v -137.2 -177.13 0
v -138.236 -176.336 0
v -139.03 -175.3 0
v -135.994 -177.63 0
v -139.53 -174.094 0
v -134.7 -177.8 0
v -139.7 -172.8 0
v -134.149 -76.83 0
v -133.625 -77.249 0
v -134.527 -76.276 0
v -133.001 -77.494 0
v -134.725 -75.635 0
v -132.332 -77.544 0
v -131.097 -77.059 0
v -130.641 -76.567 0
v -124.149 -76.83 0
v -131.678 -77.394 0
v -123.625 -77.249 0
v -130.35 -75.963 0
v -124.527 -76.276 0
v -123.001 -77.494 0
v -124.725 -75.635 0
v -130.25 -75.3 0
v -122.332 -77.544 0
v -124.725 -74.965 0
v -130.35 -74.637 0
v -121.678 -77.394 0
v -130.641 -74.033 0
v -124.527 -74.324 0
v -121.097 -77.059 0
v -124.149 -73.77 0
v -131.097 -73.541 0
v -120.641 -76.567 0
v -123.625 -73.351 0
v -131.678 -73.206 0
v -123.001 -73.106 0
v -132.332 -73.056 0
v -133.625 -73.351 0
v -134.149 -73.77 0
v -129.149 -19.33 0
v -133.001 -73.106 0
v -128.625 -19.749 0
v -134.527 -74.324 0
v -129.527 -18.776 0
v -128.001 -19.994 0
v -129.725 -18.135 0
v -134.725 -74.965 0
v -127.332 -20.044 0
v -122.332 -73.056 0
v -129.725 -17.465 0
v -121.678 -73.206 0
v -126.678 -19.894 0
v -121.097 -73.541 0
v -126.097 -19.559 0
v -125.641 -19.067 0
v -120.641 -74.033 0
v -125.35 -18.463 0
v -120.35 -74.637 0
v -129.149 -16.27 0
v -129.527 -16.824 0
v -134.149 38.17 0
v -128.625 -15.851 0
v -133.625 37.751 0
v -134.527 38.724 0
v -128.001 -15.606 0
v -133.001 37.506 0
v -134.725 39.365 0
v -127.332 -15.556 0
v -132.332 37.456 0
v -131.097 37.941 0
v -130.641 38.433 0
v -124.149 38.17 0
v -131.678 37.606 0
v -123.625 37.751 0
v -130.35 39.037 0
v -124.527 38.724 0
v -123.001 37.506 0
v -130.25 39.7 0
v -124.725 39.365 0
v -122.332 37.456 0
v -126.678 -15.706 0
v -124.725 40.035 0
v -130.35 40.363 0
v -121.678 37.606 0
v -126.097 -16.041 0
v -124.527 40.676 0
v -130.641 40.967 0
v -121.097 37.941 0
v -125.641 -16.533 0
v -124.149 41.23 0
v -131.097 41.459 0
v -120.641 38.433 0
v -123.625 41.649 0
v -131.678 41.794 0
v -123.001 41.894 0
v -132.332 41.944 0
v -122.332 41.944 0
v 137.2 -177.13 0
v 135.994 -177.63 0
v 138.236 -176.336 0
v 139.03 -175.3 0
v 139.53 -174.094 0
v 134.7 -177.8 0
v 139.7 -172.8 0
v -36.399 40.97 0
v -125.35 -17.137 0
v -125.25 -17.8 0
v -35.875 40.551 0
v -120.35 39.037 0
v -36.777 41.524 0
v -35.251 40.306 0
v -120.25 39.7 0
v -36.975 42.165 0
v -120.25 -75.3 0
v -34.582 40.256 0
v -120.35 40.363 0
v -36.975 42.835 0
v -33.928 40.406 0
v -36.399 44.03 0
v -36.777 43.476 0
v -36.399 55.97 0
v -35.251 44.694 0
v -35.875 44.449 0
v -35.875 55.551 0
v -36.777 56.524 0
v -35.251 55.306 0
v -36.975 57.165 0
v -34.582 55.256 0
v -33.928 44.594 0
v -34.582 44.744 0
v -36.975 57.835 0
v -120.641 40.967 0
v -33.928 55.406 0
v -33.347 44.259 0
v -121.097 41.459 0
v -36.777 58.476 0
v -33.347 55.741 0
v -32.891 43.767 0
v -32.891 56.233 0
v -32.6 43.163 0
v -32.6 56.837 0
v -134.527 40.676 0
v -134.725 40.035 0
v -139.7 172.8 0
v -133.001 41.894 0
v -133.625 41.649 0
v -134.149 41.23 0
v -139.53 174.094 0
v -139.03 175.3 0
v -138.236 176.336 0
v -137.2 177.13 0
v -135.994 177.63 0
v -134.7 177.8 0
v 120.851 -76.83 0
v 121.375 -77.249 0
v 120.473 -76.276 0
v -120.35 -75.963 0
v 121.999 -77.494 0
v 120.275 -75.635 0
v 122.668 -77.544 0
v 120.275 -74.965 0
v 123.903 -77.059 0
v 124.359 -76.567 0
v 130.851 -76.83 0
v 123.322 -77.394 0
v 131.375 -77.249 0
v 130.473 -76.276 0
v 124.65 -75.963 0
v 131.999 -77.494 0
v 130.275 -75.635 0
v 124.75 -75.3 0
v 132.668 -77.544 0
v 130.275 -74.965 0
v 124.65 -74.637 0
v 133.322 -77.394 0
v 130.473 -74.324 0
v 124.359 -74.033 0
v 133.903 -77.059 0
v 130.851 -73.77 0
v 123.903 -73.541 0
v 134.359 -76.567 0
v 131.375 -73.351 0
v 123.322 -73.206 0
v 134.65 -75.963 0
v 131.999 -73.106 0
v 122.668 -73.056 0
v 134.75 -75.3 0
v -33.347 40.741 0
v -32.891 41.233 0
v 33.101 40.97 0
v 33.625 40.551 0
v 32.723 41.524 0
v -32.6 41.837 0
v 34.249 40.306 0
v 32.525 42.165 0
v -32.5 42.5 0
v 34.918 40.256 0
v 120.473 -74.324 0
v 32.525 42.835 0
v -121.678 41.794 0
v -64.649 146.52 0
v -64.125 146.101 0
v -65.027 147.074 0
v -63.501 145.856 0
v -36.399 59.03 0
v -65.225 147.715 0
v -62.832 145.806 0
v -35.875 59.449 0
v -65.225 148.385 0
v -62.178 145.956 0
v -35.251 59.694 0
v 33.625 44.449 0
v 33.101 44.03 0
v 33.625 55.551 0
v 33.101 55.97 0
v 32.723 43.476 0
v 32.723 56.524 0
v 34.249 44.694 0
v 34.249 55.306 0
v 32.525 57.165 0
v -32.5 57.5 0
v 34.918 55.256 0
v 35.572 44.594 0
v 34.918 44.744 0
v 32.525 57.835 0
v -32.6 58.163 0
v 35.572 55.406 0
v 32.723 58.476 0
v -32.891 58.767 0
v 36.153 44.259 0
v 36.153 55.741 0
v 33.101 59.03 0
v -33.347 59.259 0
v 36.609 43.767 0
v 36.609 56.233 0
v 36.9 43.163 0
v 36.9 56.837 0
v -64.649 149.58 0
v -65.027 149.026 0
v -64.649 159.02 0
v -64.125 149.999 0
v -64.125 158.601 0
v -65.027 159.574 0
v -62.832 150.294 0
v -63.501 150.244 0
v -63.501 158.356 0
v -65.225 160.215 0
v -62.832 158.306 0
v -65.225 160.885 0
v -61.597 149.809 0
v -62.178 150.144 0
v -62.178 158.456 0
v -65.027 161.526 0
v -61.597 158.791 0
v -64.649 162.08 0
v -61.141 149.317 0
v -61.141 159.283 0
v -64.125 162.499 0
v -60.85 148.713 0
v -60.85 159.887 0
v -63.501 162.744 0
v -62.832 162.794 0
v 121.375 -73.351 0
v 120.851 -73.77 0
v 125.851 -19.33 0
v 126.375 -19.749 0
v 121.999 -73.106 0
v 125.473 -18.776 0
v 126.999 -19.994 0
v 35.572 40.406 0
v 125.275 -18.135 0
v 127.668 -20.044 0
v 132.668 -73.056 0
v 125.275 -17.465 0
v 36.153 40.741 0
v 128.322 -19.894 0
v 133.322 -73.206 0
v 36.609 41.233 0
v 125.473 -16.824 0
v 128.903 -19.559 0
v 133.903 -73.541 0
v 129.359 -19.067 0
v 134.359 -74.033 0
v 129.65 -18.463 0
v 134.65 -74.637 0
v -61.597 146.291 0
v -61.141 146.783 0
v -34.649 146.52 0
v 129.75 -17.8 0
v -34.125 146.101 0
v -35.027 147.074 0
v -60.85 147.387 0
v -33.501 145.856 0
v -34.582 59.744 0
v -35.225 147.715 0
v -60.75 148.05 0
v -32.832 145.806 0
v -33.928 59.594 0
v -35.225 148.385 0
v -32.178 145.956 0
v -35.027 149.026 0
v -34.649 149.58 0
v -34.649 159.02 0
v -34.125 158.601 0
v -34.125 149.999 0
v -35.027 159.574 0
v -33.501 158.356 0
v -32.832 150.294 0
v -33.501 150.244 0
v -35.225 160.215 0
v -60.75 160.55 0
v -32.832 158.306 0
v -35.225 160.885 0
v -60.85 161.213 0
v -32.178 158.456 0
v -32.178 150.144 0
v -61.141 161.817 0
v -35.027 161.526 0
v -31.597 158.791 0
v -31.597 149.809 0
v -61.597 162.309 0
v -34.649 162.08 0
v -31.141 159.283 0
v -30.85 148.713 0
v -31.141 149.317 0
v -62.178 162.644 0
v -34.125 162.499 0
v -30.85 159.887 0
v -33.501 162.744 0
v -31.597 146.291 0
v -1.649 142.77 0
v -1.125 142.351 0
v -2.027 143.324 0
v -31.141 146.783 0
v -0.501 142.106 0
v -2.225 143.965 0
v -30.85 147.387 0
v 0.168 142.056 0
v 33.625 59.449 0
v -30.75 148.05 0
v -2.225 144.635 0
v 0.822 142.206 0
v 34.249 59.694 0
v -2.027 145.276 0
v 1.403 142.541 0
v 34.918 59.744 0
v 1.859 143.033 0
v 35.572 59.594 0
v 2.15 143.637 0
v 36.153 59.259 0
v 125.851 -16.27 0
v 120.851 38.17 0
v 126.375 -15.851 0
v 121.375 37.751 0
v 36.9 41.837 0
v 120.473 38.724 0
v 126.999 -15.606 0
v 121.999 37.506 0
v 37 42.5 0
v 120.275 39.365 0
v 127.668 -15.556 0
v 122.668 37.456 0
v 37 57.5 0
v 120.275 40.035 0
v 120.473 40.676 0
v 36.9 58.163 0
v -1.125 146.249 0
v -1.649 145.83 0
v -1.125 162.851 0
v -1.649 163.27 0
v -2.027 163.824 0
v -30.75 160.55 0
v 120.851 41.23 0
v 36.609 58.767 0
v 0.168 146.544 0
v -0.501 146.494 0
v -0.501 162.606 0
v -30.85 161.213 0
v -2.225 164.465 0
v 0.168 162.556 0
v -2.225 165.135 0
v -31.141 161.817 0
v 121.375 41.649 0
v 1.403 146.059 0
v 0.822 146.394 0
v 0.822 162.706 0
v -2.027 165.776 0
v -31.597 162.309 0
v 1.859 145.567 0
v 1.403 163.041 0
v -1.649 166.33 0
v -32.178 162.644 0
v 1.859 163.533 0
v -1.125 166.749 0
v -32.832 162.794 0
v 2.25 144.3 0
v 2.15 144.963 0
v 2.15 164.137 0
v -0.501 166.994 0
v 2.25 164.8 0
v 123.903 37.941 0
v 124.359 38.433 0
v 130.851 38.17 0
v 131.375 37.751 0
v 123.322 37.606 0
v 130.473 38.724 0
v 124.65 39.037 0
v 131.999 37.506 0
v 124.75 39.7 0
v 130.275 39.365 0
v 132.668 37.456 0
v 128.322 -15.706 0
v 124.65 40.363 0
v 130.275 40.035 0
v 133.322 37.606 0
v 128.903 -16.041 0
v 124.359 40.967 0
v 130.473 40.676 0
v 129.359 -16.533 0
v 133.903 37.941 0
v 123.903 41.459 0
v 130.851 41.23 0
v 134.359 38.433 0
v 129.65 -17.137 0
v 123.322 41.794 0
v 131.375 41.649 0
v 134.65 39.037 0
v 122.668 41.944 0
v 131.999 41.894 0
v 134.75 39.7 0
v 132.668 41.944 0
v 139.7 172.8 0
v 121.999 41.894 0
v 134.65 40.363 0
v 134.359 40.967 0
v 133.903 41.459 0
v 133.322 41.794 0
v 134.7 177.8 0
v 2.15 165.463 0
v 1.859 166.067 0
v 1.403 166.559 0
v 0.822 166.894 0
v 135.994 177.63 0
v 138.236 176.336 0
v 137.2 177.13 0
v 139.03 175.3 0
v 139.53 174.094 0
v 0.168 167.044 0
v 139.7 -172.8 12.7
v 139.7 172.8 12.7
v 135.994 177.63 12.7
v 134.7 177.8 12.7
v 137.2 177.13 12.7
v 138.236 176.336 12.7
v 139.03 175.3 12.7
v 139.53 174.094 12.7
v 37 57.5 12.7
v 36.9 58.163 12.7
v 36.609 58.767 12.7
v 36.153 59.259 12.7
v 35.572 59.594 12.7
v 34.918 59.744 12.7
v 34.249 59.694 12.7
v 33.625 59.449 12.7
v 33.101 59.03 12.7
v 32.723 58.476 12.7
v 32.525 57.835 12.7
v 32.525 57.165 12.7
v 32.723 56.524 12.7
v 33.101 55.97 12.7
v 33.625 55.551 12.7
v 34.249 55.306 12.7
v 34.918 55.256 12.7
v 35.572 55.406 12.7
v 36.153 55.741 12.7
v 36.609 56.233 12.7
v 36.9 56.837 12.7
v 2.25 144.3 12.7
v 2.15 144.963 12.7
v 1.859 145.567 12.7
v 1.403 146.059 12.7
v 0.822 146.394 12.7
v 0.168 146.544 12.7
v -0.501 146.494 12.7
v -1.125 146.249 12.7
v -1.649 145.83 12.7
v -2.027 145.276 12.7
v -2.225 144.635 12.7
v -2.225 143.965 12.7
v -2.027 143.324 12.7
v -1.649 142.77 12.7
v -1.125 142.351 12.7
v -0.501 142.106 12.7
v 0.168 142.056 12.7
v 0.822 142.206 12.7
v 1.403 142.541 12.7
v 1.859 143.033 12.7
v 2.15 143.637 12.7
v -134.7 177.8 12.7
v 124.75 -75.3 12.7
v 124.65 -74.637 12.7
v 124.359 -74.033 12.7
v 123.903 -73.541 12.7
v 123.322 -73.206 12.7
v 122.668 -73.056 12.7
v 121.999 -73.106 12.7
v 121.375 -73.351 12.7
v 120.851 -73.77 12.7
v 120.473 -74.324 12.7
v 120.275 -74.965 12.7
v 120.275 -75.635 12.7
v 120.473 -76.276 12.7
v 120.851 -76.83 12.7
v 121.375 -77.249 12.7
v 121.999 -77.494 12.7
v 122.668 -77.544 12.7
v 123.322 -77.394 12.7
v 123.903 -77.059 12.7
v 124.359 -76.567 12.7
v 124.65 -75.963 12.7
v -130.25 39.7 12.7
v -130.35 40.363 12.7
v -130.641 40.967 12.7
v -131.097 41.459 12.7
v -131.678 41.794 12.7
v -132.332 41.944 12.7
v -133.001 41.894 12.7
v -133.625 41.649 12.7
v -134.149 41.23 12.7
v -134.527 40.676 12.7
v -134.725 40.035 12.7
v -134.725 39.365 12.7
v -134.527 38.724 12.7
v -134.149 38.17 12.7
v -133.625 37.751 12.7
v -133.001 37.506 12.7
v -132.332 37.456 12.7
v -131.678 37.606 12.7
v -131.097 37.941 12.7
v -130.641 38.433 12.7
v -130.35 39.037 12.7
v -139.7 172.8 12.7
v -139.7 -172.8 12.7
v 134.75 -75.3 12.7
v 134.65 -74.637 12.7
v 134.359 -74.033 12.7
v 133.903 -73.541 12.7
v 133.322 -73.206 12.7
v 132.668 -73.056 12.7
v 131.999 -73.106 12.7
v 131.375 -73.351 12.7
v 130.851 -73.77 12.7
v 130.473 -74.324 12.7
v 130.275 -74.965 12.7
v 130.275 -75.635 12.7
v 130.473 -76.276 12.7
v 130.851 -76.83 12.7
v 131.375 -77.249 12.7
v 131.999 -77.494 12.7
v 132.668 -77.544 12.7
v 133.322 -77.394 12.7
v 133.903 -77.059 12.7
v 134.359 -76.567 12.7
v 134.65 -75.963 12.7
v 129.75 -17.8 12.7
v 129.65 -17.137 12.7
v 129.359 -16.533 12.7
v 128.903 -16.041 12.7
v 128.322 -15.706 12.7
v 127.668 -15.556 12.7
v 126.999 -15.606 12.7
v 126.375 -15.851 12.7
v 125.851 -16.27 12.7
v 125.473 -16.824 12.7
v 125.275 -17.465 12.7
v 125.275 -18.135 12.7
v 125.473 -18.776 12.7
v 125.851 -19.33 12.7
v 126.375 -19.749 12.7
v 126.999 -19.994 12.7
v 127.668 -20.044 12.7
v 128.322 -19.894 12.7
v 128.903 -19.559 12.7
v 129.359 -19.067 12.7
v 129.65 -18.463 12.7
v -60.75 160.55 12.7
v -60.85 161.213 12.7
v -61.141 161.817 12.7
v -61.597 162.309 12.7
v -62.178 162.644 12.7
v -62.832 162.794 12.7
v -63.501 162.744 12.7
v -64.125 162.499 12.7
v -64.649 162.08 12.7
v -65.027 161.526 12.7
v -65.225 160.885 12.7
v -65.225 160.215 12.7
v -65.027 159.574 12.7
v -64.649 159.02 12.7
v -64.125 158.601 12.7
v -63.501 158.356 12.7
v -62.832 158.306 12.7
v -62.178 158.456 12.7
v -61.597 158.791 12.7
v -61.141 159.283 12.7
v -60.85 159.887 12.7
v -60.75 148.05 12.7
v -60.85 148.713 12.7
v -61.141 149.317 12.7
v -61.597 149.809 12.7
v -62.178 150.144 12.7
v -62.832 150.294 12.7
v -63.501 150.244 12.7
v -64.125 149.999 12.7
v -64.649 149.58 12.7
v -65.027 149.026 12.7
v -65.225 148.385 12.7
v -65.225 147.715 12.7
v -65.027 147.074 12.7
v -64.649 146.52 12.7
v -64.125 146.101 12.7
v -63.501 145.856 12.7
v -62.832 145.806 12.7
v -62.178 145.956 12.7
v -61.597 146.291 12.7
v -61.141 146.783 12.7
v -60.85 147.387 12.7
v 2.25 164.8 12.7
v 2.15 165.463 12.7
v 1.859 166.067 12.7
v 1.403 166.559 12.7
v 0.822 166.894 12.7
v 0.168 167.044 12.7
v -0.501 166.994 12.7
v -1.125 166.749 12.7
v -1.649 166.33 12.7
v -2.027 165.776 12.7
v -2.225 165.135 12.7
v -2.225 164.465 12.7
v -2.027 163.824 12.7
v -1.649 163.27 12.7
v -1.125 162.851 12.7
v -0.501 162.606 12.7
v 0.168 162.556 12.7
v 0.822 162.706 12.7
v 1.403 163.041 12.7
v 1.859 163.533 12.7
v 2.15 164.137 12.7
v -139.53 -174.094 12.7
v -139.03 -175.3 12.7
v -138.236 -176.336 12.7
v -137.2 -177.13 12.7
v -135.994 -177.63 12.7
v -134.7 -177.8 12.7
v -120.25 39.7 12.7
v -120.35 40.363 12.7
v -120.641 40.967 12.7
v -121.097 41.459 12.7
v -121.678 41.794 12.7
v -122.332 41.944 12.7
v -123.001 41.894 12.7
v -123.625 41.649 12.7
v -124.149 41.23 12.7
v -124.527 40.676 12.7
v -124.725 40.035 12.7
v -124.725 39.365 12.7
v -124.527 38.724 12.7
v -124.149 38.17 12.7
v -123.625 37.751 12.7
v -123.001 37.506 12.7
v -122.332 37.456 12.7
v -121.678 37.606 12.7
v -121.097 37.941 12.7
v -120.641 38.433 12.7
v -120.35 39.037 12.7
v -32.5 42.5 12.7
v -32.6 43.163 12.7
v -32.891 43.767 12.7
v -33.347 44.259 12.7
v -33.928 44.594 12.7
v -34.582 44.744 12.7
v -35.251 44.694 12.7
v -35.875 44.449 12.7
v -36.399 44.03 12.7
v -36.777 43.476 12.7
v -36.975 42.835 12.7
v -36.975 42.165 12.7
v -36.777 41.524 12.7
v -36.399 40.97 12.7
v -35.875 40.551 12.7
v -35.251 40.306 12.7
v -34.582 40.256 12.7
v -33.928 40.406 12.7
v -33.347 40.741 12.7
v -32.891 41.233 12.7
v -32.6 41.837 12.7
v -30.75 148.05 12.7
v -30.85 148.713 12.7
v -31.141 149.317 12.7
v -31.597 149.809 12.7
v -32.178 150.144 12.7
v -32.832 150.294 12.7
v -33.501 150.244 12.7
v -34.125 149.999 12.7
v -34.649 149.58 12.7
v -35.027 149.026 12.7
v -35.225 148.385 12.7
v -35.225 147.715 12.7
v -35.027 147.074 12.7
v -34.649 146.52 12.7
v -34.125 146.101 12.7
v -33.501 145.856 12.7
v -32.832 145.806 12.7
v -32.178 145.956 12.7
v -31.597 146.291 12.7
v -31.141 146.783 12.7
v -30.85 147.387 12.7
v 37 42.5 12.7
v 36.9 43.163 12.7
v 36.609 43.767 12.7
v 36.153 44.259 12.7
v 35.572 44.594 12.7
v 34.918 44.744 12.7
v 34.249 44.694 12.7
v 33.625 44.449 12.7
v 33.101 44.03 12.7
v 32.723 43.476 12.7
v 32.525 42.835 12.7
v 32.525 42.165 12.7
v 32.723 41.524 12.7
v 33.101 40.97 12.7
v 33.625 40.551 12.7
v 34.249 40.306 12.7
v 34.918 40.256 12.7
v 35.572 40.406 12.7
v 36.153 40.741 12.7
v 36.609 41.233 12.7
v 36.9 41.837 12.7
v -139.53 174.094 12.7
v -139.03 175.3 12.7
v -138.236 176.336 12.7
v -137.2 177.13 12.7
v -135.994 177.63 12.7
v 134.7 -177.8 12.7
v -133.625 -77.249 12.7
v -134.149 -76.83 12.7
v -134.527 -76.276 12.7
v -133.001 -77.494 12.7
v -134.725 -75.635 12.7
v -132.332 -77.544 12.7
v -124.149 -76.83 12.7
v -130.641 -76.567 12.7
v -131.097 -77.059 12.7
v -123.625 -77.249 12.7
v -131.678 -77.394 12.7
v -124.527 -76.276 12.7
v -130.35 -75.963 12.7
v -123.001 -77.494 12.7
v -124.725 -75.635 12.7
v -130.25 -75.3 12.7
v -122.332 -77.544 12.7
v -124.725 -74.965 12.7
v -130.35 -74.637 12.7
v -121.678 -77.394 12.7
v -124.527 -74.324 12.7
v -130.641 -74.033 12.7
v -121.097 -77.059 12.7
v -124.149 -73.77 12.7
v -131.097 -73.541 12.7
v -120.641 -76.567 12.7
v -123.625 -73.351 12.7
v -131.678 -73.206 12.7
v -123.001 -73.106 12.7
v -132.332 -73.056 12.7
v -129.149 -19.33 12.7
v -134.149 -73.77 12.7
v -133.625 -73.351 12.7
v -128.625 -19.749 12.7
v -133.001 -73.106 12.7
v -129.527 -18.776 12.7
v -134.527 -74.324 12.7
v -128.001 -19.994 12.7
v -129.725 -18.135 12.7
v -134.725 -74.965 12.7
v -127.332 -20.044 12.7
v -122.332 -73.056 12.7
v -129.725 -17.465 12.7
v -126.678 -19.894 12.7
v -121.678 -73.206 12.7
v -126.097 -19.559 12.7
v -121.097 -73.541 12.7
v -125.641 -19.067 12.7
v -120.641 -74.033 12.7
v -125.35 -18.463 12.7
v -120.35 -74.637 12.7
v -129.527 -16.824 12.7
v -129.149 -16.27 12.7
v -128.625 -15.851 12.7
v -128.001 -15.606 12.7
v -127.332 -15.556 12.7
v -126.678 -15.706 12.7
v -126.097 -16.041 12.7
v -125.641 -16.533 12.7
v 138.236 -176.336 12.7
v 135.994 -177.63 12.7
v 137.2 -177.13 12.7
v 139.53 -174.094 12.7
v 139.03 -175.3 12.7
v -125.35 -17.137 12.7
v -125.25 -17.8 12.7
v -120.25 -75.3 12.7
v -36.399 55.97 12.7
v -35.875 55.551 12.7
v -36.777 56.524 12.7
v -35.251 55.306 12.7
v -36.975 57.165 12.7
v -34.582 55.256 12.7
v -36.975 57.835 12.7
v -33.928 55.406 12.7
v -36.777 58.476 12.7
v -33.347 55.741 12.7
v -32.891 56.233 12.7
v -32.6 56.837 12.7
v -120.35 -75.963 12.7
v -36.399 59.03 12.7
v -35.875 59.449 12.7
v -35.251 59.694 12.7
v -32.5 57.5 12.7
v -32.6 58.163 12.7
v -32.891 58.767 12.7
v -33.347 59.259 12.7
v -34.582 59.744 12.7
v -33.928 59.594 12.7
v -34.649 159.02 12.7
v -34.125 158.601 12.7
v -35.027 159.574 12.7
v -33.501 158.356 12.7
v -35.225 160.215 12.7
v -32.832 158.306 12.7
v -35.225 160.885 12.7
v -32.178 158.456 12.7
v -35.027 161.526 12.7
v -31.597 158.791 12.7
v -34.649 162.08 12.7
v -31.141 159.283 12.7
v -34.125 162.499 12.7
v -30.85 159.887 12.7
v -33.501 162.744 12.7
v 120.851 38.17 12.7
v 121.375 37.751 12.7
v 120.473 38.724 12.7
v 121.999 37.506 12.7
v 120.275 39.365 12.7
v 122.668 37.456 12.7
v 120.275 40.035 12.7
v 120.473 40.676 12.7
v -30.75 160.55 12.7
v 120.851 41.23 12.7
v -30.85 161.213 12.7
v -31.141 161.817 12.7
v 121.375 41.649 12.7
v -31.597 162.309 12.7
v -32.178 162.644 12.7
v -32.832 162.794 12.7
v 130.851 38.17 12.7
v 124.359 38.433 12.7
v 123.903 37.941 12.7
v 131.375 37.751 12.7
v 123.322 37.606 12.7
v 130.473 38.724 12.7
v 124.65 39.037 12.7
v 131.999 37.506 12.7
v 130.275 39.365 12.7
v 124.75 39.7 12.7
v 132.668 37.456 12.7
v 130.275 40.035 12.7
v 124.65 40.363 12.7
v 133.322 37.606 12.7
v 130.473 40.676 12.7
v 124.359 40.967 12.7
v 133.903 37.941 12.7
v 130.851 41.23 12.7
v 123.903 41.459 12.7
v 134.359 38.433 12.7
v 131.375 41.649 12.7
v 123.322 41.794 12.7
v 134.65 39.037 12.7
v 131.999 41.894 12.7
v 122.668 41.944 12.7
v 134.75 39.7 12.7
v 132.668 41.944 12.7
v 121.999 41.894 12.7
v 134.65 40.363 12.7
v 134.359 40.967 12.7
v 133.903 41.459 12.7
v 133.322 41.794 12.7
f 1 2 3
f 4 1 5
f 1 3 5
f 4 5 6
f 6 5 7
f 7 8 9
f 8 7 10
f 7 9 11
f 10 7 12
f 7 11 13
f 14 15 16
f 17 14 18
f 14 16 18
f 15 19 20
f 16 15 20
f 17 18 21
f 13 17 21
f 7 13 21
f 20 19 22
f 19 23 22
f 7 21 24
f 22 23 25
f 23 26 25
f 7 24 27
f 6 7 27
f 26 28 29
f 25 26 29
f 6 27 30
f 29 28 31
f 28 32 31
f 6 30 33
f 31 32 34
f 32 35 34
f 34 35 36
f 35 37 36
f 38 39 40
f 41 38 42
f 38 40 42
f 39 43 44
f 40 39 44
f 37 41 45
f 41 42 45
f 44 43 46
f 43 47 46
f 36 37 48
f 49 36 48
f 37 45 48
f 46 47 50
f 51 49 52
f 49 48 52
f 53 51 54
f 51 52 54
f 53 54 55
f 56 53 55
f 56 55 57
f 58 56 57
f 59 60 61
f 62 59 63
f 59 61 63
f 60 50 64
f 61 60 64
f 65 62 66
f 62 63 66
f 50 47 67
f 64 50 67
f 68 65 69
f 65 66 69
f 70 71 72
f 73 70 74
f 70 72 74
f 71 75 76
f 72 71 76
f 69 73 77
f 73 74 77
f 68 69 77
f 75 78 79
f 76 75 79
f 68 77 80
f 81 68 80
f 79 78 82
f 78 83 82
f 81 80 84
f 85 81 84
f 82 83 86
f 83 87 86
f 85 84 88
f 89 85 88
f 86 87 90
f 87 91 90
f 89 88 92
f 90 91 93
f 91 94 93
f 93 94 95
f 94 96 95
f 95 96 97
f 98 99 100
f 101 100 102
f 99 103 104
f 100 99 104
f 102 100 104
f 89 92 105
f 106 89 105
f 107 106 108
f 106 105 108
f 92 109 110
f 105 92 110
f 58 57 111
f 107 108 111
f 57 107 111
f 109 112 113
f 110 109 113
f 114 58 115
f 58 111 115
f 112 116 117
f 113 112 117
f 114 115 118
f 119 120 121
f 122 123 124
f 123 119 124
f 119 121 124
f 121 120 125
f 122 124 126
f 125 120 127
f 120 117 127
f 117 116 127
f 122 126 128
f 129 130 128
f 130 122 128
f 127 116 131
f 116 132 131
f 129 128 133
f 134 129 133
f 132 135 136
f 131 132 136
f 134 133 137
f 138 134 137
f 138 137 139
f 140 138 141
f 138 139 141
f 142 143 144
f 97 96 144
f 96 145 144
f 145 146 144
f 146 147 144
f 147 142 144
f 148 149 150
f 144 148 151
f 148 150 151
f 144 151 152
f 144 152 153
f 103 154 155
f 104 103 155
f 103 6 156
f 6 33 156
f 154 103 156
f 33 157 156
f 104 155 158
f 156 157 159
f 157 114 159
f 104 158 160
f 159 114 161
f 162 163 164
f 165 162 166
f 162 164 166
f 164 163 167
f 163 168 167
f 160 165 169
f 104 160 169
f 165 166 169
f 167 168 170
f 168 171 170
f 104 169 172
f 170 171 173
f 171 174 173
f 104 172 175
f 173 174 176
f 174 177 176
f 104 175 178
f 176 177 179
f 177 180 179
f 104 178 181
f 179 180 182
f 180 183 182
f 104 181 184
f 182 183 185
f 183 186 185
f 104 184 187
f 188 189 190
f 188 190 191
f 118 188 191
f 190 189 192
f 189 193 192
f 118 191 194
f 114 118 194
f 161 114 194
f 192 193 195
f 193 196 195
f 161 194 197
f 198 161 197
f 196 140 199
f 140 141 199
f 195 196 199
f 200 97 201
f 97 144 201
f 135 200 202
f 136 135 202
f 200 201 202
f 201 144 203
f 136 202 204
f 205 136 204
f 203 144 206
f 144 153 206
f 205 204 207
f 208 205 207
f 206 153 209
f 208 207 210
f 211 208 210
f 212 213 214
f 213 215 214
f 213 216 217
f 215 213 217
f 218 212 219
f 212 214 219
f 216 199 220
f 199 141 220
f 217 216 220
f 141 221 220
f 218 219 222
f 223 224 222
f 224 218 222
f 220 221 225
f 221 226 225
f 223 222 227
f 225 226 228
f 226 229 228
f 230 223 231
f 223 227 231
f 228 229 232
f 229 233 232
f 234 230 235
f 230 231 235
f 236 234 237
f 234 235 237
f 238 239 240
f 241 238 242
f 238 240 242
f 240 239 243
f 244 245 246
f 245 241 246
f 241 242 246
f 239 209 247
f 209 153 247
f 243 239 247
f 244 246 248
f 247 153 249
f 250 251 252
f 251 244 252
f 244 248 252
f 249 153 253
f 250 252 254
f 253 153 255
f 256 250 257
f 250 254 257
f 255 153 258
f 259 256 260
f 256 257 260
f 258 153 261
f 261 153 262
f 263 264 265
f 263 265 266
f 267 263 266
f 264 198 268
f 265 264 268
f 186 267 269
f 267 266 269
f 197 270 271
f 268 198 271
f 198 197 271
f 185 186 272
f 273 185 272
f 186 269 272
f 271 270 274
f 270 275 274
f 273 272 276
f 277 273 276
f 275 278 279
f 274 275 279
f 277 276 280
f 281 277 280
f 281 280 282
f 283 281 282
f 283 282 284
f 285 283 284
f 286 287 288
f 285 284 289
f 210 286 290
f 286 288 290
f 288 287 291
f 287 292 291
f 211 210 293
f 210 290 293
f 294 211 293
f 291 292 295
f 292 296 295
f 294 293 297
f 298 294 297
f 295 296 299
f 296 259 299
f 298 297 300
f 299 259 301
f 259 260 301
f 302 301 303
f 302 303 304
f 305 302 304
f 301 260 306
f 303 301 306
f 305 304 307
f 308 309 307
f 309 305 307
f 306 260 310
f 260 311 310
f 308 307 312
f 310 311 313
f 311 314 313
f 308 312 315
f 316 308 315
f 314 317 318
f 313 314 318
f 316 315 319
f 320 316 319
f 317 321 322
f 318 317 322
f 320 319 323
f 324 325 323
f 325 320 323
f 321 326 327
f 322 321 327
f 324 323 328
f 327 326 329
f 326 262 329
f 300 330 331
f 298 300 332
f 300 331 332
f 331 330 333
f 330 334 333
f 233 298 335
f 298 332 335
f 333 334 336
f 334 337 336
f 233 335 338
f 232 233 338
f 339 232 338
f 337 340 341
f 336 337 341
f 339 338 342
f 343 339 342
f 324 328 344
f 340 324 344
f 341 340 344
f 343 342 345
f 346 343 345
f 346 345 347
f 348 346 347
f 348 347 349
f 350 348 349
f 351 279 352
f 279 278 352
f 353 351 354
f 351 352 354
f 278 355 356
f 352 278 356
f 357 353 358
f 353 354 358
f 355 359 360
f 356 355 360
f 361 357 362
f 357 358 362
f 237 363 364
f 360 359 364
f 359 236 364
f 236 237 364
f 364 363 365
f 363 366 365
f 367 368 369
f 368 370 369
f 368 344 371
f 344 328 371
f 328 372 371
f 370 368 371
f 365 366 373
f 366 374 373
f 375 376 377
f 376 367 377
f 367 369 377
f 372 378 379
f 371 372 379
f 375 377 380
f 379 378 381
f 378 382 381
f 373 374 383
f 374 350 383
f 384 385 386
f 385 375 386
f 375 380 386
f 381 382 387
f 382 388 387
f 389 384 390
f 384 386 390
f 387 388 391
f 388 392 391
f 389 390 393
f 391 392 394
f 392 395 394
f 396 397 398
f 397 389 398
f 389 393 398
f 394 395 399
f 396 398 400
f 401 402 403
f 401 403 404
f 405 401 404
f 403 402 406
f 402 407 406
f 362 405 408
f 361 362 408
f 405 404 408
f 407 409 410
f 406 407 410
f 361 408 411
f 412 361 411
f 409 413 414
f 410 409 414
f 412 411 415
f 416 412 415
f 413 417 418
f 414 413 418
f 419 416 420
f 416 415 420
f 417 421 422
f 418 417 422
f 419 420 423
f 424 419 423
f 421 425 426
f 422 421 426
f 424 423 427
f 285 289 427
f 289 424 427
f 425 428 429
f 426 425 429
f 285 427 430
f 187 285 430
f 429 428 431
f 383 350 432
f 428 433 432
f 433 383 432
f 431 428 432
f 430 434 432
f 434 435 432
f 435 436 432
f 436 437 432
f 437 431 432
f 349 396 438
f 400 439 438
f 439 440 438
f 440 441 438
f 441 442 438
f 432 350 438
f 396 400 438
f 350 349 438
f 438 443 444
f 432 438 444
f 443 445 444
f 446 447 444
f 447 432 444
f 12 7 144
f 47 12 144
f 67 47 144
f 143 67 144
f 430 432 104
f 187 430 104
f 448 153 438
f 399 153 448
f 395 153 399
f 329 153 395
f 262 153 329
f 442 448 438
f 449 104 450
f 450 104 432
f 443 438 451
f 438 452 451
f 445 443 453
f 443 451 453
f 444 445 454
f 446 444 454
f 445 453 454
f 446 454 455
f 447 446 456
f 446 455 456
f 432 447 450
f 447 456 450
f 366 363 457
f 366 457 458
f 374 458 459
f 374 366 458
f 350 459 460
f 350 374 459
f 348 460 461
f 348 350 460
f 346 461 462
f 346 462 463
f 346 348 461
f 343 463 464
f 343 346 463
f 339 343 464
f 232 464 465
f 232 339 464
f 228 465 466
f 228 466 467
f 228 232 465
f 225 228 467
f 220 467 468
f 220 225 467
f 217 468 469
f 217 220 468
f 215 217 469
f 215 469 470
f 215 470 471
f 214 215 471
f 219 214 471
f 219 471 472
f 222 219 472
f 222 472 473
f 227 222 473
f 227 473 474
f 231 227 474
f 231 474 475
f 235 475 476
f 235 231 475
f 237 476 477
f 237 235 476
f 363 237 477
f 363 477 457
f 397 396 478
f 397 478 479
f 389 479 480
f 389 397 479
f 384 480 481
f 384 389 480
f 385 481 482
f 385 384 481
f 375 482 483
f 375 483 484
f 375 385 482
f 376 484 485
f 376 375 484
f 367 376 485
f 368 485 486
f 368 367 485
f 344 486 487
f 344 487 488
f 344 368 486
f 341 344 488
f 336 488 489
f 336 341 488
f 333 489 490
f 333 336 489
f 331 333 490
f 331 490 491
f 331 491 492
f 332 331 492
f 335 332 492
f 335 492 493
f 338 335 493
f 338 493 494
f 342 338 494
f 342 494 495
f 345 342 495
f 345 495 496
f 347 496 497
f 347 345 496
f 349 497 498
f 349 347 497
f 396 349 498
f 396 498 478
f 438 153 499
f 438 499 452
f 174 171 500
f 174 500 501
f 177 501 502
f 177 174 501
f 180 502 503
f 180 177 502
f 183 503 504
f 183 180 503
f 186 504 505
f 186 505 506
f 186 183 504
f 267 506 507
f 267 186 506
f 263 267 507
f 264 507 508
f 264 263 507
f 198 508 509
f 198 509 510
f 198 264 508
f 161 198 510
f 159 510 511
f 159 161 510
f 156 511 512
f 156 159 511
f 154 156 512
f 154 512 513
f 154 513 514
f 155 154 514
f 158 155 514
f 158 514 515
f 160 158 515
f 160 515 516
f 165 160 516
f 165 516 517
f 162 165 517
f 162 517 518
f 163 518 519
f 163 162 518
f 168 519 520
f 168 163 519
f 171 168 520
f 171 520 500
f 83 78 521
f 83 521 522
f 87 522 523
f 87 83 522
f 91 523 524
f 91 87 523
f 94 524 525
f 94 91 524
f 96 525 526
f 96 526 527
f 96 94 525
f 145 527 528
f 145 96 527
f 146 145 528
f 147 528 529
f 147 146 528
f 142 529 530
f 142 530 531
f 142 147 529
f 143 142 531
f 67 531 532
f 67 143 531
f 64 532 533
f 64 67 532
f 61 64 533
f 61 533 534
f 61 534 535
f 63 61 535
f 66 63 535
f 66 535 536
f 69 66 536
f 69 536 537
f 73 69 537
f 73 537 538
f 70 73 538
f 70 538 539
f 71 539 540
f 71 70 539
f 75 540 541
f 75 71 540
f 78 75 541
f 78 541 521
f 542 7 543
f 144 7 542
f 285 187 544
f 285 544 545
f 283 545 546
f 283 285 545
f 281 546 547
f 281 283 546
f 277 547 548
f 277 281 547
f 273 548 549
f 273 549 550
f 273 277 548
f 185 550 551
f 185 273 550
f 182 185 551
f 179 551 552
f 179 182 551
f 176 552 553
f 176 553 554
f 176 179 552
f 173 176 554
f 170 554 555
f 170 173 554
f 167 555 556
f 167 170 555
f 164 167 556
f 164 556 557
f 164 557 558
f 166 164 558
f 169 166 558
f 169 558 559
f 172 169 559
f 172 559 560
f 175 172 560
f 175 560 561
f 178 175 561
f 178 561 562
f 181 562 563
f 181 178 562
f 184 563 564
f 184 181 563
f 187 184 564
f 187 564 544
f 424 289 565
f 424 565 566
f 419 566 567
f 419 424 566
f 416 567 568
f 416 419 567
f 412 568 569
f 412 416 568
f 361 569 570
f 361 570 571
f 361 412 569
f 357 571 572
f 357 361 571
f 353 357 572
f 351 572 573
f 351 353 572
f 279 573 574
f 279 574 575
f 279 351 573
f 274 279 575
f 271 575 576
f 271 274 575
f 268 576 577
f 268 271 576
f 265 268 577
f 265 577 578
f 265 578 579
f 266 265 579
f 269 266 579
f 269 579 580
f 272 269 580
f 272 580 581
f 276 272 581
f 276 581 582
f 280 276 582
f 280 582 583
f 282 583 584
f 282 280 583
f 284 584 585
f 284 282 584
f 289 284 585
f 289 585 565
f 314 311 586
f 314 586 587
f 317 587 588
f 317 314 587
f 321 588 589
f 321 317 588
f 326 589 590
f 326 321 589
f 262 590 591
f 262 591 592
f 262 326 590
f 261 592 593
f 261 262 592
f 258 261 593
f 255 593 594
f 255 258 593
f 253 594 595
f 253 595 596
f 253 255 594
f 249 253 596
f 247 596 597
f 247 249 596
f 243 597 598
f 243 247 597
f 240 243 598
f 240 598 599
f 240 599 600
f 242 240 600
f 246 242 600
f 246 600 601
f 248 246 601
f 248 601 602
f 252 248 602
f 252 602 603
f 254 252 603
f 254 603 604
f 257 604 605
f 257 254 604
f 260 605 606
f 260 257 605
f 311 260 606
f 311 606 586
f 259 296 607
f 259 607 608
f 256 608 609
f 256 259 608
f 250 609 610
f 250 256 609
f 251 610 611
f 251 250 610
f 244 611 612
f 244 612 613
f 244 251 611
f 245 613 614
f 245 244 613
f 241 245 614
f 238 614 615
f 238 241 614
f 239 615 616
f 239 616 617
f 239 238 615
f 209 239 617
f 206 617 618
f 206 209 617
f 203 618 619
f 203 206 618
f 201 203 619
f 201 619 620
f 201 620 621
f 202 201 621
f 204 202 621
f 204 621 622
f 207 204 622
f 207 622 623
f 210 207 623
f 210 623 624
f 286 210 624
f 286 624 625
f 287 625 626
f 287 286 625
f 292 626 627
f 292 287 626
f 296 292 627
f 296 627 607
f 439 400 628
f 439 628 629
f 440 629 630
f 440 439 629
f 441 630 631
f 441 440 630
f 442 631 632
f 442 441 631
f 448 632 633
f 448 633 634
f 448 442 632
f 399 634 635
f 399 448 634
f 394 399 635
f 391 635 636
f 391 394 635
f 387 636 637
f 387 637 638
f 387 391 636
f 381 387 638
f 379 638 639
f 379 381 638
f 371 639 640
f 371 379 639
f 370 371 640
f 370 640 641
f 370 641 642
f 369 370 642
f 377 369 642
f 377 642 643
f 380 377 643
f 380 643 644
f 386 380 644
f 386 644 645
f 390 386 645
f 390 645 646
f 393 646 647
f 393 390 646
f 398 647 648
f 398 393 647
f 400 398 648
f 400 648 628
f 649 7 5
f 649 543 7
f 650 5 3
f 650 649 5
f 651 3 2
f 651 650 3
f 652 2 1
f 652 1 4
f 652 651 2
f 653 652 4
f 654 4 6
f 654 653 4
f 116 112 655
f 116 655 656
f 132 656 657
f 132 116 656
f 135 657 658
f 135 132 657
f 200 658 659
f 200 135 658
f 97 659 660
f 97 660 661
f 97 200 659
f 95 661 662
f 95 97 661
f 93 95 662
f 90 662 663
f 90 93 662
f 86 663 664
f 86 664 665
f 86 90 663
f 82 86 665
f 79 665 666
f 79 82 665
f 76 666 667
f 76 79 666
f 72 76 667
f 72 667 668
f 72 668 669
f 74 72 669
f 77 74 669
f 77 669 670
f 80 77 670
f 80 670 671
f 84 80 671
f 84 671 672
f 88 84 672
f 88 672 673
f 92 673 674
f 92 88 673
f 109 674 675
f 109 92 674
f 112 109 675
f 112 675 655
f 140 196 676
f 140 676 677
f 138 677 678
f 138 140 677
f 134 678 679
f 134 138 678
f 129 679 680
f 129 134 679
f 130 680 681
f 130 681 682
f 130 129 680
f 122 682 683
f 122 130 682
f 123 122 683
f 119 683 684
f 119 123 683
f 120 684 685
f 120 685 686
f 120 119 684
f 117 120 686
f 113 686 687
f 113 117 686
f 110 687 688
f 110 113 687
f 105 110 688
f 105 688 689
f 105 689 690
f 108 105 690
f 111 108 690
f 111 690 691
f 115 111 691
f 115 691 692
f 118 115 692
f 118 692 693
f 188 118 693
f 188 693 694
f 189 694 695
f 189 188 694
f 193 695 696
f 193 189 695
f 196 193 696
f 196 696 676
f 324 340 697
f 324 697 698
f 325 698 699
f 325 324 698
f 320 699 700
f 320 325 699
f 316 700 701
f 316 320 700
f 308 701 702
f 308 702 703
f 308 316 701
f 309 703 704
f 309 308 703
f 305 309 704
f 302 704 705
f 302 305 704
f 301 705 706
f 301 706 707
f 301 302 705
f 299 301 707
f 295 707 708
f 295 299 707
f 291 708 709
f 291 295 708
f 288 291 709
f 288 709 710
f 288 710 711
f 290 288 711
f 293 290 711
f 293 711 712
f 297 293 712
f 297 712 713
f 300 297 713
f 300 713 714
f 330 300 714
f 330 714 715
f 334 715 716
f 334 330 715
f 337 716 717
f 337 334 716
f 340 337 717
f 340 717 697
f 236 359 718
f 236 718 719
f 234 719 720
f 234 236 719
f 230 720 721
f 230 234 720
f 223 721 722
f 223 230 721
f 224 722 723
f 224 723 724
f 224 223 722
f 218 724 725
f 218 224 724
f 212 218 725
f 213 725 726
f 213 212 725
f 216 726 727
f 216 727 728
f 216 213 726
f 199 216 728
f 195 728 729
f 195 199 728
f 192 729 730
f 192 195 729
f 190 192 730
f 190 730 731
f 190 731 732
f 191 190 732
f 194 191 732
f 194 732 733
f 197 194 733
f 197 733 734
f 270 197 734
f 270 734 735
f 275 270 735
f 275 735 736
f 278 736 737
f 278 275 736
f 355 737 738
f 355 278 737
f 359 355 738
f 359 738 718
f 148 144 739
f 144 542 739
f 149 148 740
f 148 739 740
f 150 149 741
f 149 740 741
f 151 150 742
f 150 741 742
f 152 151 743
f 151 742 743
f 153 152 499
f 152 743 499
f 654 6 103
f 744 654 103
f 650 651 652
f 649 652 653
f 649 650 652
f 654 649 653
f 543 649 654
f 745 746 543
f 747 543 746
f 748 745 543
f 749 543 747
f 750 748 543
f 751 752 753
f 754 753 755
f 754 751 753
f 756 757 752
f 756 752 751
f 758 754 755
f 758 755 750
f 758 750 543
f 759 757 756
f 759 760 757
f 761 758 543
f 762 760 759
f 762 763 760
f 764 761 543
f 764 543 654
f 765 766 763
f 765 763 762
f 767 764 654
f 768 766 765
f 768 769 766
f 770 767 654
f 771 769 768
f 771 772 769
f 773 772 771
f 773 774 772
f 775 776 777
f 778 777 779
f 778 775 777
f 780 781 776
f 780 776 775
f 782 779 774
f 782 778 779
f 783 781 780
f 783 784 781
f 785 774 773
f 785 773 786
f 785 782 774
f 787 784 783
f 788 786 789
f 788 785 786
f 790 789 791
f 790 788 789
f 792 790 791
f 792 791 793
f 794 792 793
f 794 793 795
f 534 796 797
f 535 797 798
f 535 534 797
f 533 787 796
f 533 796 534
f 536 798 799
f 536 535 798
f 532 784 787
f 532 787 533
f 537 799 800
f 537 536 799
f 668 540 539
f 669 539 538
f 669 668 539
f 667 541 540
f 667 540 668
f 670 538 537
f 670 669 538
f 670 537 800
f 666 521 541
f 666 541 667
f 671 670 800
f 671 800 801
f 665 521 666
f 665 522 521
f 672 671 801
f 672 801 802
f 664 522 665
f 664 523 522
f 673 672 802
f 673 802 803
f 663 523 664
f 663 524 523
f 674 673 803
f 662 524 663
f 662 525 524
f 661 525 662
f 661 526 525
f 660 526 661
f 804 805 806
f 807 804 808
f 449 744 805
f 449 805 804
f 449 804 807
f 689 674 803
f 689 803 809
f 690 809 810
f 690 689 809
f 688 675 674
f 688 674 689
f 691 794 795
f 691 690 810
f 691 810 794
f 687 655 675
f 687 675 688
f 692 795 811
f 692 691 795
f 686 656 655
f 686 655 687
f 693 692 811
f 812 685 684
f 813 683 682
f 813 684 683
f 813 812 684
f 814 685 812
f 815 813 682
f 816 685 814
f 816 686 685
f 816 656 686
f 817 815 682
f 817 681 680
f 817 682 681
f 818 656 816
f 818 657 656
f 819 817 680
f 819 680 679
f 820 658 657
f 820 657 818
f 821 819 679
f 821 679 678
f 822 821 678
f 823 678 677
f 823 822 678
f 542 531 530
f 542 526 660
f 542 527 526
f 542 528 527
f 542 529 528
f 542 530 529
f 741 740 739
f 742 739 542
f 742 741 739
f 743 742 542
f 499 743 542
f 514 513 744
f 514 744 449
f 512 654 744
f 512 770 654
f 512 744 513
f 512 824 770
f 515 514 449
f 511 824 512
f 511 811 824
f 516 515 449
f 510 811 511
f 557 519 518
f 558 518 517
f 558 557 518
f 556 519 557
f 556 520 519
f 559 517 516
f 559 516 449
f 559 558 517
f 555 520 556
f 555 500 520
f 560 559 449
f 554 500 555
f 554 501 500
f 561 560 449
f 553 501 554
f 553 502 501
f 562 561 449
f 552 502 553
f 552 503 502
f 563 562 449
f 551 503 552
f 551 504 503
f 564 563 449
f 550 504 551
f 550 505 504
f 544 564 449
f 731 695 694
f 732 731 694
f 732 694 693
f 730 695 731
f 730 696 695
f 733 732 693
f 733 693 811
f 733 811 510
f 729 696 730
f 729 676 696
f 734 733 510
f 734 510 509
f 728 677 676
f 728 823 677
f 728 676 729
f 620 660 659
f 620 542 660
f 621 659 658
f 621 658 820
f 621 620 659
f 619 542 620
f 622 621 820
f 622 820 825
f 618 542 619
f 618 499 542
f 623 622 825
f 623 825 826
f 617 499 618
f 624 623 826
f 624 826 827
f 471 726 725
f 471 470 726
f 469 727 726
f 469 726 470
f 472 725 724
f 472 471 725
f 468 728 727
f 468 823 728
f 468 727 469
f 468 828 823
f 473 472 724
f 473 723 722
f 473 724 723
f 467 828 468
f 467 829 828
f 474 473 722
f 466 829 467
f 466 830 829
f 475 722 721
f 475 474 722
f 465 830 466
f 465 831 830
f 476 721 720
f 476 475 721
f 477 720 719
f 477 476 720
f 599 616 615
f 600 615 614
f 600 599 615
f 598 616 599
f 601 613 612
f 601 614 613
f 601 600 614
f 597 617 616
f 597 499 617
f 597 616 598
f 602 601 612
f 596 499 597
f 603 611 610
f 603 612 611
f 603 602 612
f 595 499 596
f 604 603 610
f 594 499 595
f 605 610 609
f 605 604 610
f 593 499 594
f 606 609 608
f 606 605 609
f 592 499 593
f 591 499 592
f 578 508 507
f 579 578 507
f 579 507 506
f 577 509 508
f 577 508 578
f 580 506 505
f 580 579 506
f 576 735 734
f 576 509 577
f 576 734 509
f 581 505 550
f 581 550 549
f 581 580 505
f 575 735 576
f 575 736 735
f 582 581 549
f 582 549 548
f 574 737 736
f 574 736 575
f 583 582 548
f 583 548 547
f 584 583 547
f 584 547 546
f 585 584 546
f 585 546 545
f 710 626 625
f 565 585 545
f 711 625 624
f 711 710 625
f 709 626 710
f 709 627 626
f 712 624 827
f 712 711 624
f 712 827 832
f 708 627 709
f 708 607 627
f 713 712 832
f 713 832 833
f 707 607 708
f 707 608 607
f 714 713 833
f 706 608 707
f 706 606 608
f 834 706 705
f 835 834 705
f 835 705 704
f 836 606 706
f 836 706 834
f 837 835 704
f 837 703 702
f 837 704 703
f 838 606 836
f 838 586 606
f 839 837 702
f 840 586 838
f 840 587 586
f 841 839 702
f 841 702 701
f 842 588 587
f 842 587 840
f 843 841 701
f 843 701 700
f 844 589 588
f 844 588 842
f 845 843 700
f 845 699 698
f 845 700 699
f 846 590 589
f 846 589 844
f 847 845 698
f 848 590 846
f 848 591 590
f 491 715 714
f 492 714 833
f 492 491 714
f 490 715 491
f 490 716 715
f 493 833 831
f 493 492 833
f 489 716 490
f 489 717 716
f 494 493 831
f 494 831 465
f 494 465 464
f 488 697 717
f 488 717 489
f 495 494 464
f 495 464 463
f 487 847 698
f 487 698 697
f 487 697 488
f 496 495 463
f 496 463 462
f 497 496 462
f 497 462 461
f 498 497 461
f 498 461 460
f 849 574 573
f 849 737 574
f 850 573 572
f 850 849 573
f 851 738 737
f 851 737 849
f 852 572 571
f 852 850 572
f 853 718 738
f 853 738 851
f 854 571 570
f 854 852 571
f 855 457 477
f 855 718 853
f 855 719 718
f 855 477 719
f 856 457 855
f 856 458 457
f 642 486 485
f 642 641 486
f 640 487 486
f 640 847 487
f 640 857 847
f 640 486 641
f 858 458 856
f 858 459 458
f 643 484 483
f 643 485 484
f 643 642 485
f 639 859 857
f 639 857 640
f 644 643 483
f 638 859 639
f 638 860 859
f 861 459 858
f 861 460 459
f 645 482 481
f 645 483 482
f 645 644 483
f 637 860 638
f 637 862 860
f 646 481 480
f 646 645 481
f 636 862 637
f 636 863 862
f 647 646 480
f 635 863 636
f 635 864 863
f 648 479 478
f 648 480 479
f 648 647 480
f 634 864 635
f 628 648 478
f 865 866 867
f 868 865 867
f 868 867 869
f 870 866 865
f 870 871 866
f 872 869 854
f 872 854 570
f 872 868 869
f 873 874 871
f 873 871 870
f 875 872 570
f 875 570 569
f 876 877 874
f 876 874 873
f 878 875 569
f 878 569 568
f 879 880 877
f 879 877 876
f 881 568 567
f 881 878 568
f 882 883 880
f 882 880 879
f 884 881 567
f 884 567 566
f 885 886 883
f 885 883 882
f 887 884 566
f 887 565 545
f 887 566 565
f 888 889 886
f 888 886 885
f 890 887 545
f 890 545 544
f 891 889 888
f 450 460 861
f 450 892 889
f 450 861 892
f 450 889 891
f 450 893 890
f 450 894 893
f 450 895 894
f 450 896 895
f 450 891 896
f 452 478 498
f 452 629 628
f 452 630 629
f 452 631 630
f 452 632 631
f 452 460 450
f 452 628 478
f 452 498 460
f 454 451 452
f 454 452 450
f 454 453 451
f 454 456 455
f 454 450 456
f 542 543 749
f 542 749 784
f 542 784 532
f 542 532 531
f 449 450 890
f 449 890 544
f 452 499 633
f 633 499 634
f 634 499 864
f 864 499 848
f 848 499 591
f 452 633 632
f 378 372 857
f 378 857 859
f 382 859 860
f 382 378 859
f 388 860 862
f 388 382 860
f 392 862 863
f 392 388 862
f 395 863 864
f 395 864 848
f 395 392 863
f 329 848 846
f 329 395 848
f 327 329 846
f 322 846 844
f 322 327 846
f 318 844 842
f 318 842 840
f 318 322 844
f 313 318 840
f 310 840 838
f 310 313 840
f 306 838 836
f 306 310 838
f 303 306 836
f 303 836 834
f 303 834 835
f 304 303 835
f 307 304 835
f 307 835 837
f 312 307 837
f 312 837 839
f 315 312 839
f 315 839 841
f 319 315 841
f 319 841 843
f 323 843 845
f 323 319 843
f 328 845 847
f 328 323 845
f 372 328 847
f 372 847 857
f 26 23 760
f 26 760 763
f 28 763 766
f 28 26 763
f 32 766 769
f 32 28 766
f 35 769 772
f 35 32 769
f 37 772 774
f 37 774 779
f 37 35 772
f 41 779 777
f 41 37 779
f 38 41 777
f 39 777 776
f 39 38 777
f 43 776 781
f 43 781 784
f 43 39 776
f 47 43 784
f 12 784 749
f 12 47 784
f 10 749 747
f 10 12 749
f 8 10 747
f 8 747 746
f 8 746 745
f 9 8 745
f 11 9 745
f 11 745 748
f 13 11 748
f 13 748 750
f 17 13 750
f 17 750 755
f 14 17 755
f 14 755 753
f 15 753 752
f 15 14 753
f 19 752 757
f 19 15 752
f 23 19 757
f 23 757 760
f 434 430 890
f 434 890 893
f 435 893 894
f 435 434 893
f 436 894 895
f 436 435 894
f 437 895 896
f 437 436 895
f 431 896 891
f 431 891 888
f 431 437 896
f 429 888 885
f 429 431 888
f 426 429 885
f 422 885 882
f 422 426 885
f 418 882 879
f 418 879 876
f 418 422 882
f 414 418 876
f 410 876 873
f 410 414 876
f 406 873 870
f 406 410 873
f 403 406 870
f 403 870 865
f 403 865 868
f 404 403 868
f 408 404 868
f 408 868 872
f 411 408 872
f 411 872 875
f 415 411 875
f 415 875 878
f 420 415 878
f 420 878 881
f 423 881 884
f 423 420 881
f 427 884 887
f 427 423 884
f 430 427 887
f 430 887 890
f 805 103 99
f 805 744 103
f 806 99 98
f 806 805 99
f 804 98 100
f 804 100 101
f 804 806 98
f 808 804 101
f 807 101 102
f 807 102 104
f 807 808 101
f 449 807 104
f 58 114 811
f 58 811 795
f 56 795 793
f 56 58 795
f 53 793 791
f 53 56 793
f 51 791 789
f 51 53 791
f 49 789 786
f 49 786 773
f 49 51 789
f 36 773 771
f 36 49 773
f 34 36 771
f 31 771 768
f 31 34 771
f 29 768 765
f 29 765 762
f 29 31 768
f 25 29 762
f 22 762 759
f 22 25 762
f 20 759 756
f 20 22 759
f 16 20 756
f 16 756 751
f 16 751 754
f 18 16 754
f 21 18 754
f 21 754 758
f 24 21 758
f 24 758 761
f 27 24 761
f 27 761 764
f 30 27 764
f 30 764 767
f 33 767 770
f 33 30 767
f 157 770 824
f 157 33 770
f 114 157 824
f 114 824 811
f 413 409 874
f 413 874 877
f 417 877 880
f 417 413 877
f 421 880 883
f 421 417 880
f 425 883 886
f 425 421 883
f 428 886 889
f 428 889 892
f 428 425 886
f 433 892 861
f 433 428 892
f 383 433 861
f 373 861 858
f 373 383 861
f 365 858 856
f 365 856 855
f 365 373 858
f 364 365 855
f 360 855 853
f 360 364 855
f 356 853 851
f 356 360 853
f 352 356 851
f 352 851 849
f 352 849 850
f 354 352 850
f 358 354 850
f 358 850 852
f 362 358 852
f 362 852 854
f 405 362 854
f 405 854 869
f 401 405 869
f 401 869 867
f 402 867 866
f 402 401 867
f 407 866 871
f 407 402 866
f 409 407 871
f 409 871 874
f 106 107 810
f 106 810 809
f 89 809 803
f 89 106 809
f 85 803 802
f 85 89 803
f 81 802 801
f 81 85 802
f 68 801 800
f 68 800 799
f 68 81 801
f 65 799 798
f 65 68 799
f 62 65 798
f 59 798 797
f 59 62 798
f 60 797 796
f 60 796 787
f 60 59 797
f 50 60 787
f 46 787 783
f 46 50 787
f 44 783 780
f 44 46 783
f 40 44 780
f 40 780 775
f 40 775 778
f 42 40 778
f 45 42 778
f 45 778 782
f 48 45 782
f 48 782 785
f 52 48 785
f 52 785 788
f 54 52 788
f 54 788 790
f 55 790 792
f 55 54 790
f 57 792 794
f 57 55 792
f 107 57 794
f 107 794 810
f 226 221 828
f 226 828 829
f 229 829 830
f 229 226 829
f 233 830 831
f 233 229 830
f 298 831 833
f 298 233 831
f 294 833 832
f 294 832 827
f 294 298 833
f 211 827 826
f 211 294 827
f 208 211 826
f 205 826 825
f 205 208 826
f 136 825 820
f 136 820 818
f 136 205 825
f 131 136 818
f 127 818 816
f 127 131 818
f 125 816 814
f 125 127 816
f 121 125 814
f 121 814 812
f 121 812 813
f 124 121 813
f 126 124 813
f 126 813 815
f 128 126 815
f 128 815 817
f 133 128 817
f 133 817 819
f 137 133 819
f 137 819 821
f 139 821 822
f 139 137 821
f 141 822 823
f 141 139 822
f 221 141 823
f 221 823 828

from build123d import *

# Parameters (mm, degrees)
F0_W     = 279.4
F0_H     = 355.6
F0_R     = 2.25
F1_DEPTH = 12.7
F2_R     = 5


with BuildPart() as f1:
    # F0 (on Top) → F1 (new body)
    with BuildSketch(Plane.XY):
        Rectangle(F0_W, F0_H)
        with Locations((-132.5, -75.3)):
            Circle(F0_R, mode=Mode.SUBTRACT)
        with Locations((-122.5, -75.3)):
            Circle(F0_R, mode=Mode.SUBTRACT)
        with Locations((-127.5, -17.8)):
            Circle(F0_R, mode=Mode.SUBTRACT)
        with Locations((122.5, -75.3)):
            Circle(F0_R, mode=Mode.SUBTRACT)
        with Locations((132.5, -75.3)):
            Circle(F0_R, mode=Mode.SUBTRACT)
        with Locations((127.5, -17.8)):
            Circle(F0_R, mode=Mode.SUBTRACT)
        with Locations((-132.5, 39.7)):
            Circle(F0_R, mode=Mode.SUBTRACT)
        with Locations((-122.5, 39.7)):
            Circle(F0_R, mode=Mode.SUBTRACT)
        with Locations((-34.75, 42.5)):
            Circle(F0_R, mode=Mode.SUBTRACT)
        with Locations((-34.75, 57.5)):
            Circle(F0_R, mode=Mode.SUBTRACT)
        with Locations((-63, 148.05)):
            Circle(F0_R, mode=Mode.SUBTRACT)
        with Locations((-63, 160.55)):
            Circle(F0_R, mode=Mode.SUBTRACT)
        with Locations((-33, 148.05)):
            Circle(F0_R, mode=Mode.SUBTRACT)
        with Locations((-33, 160.55)):
            Circle(F0_R, mode=Mode.SUBTRACT)
        with Locations((34.75, 42.5)):
            Circle(F0_R, mode=Mode.SUBTRACT)
        with Locations((34.75, 57.5)):
            Circle(F0_R, mode=Mode.SUBTRACT)
        with Locations((122.5, 39.7)):
            Circle(F0_R, mode=Mode.SUBTRACT)
        with Locations((132.5, 39.7)):
            Circle(F0_R, mode=Mode.SUBTRACT)
        with Locations((0, 144.3)):
            Circle(F0_R, mode=Mode.SUBTRACT)
        with Locations((0, 164.8)):
            Circle(F0_R, mode=Mode.SUBTRACT)
    extrude(amount=F1_DEPTH)

    # F2
    f2_edges = [f1.edges().sort_by_distance(p)[0] for p in [
        (-139.7, -177.8, 6.35),
        (139.7, -177.8, 6.35),
        (139.7, 177.8, 6.35),
        (-139.7, 177.8, 6.35),
    ]]
    fillet(f2_edges, radius=F2_R)


solid = f1.part
